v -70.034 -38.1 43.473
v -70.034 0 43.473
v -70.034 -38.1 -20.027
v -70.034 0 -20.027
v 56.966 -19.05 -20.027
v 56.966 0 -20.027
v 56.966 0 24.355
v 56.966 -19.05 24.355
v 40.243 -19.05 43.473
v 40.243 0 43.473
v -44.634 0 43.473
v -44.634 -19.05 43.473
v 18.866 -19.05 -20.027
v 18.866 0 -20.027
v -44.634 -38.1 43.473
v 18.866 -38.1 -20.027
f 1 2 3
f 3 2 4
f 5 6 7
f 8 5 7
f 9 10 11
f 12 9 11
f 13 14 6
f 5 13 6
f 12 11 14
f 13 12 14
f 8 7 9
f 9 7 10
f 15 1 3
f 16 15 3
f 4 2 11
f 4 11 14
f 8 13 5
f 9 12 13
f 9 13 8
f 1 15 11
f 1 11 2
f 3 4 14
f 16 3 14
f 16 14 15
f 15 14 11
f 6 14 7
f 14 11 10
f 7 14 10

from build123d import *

# Parameters (mm, degrees)
F1_DEPTH = 38.1
F2_DEPTH = 19.05


with BuildPart() as f1:
    # F0 (on Front) → F1 (new body)
    with BuildSketch(Plane.XZ):
        Polygon((-44.634447, 43.473302), (-70.034447, 43.473302), (-70.034447, -20.026698), (18.865553, -20.026698), align=None)
    extrude(amount=F1_DEPTH)


with BuildPart() as f2:
    # F0 (on Front) → F2 (new body)
    with BuildSketch(Plane.XZ):
        Polygon((40.242975, 43.473302), (-44.634447, 43.473302), (18.865553, -20.026698), (56.965553, -20.026698), (56.965553, 24.354845), align=None)
    extrude(amount=F2_DEPTH)


solid = Compound([f1.part, f2.part])
